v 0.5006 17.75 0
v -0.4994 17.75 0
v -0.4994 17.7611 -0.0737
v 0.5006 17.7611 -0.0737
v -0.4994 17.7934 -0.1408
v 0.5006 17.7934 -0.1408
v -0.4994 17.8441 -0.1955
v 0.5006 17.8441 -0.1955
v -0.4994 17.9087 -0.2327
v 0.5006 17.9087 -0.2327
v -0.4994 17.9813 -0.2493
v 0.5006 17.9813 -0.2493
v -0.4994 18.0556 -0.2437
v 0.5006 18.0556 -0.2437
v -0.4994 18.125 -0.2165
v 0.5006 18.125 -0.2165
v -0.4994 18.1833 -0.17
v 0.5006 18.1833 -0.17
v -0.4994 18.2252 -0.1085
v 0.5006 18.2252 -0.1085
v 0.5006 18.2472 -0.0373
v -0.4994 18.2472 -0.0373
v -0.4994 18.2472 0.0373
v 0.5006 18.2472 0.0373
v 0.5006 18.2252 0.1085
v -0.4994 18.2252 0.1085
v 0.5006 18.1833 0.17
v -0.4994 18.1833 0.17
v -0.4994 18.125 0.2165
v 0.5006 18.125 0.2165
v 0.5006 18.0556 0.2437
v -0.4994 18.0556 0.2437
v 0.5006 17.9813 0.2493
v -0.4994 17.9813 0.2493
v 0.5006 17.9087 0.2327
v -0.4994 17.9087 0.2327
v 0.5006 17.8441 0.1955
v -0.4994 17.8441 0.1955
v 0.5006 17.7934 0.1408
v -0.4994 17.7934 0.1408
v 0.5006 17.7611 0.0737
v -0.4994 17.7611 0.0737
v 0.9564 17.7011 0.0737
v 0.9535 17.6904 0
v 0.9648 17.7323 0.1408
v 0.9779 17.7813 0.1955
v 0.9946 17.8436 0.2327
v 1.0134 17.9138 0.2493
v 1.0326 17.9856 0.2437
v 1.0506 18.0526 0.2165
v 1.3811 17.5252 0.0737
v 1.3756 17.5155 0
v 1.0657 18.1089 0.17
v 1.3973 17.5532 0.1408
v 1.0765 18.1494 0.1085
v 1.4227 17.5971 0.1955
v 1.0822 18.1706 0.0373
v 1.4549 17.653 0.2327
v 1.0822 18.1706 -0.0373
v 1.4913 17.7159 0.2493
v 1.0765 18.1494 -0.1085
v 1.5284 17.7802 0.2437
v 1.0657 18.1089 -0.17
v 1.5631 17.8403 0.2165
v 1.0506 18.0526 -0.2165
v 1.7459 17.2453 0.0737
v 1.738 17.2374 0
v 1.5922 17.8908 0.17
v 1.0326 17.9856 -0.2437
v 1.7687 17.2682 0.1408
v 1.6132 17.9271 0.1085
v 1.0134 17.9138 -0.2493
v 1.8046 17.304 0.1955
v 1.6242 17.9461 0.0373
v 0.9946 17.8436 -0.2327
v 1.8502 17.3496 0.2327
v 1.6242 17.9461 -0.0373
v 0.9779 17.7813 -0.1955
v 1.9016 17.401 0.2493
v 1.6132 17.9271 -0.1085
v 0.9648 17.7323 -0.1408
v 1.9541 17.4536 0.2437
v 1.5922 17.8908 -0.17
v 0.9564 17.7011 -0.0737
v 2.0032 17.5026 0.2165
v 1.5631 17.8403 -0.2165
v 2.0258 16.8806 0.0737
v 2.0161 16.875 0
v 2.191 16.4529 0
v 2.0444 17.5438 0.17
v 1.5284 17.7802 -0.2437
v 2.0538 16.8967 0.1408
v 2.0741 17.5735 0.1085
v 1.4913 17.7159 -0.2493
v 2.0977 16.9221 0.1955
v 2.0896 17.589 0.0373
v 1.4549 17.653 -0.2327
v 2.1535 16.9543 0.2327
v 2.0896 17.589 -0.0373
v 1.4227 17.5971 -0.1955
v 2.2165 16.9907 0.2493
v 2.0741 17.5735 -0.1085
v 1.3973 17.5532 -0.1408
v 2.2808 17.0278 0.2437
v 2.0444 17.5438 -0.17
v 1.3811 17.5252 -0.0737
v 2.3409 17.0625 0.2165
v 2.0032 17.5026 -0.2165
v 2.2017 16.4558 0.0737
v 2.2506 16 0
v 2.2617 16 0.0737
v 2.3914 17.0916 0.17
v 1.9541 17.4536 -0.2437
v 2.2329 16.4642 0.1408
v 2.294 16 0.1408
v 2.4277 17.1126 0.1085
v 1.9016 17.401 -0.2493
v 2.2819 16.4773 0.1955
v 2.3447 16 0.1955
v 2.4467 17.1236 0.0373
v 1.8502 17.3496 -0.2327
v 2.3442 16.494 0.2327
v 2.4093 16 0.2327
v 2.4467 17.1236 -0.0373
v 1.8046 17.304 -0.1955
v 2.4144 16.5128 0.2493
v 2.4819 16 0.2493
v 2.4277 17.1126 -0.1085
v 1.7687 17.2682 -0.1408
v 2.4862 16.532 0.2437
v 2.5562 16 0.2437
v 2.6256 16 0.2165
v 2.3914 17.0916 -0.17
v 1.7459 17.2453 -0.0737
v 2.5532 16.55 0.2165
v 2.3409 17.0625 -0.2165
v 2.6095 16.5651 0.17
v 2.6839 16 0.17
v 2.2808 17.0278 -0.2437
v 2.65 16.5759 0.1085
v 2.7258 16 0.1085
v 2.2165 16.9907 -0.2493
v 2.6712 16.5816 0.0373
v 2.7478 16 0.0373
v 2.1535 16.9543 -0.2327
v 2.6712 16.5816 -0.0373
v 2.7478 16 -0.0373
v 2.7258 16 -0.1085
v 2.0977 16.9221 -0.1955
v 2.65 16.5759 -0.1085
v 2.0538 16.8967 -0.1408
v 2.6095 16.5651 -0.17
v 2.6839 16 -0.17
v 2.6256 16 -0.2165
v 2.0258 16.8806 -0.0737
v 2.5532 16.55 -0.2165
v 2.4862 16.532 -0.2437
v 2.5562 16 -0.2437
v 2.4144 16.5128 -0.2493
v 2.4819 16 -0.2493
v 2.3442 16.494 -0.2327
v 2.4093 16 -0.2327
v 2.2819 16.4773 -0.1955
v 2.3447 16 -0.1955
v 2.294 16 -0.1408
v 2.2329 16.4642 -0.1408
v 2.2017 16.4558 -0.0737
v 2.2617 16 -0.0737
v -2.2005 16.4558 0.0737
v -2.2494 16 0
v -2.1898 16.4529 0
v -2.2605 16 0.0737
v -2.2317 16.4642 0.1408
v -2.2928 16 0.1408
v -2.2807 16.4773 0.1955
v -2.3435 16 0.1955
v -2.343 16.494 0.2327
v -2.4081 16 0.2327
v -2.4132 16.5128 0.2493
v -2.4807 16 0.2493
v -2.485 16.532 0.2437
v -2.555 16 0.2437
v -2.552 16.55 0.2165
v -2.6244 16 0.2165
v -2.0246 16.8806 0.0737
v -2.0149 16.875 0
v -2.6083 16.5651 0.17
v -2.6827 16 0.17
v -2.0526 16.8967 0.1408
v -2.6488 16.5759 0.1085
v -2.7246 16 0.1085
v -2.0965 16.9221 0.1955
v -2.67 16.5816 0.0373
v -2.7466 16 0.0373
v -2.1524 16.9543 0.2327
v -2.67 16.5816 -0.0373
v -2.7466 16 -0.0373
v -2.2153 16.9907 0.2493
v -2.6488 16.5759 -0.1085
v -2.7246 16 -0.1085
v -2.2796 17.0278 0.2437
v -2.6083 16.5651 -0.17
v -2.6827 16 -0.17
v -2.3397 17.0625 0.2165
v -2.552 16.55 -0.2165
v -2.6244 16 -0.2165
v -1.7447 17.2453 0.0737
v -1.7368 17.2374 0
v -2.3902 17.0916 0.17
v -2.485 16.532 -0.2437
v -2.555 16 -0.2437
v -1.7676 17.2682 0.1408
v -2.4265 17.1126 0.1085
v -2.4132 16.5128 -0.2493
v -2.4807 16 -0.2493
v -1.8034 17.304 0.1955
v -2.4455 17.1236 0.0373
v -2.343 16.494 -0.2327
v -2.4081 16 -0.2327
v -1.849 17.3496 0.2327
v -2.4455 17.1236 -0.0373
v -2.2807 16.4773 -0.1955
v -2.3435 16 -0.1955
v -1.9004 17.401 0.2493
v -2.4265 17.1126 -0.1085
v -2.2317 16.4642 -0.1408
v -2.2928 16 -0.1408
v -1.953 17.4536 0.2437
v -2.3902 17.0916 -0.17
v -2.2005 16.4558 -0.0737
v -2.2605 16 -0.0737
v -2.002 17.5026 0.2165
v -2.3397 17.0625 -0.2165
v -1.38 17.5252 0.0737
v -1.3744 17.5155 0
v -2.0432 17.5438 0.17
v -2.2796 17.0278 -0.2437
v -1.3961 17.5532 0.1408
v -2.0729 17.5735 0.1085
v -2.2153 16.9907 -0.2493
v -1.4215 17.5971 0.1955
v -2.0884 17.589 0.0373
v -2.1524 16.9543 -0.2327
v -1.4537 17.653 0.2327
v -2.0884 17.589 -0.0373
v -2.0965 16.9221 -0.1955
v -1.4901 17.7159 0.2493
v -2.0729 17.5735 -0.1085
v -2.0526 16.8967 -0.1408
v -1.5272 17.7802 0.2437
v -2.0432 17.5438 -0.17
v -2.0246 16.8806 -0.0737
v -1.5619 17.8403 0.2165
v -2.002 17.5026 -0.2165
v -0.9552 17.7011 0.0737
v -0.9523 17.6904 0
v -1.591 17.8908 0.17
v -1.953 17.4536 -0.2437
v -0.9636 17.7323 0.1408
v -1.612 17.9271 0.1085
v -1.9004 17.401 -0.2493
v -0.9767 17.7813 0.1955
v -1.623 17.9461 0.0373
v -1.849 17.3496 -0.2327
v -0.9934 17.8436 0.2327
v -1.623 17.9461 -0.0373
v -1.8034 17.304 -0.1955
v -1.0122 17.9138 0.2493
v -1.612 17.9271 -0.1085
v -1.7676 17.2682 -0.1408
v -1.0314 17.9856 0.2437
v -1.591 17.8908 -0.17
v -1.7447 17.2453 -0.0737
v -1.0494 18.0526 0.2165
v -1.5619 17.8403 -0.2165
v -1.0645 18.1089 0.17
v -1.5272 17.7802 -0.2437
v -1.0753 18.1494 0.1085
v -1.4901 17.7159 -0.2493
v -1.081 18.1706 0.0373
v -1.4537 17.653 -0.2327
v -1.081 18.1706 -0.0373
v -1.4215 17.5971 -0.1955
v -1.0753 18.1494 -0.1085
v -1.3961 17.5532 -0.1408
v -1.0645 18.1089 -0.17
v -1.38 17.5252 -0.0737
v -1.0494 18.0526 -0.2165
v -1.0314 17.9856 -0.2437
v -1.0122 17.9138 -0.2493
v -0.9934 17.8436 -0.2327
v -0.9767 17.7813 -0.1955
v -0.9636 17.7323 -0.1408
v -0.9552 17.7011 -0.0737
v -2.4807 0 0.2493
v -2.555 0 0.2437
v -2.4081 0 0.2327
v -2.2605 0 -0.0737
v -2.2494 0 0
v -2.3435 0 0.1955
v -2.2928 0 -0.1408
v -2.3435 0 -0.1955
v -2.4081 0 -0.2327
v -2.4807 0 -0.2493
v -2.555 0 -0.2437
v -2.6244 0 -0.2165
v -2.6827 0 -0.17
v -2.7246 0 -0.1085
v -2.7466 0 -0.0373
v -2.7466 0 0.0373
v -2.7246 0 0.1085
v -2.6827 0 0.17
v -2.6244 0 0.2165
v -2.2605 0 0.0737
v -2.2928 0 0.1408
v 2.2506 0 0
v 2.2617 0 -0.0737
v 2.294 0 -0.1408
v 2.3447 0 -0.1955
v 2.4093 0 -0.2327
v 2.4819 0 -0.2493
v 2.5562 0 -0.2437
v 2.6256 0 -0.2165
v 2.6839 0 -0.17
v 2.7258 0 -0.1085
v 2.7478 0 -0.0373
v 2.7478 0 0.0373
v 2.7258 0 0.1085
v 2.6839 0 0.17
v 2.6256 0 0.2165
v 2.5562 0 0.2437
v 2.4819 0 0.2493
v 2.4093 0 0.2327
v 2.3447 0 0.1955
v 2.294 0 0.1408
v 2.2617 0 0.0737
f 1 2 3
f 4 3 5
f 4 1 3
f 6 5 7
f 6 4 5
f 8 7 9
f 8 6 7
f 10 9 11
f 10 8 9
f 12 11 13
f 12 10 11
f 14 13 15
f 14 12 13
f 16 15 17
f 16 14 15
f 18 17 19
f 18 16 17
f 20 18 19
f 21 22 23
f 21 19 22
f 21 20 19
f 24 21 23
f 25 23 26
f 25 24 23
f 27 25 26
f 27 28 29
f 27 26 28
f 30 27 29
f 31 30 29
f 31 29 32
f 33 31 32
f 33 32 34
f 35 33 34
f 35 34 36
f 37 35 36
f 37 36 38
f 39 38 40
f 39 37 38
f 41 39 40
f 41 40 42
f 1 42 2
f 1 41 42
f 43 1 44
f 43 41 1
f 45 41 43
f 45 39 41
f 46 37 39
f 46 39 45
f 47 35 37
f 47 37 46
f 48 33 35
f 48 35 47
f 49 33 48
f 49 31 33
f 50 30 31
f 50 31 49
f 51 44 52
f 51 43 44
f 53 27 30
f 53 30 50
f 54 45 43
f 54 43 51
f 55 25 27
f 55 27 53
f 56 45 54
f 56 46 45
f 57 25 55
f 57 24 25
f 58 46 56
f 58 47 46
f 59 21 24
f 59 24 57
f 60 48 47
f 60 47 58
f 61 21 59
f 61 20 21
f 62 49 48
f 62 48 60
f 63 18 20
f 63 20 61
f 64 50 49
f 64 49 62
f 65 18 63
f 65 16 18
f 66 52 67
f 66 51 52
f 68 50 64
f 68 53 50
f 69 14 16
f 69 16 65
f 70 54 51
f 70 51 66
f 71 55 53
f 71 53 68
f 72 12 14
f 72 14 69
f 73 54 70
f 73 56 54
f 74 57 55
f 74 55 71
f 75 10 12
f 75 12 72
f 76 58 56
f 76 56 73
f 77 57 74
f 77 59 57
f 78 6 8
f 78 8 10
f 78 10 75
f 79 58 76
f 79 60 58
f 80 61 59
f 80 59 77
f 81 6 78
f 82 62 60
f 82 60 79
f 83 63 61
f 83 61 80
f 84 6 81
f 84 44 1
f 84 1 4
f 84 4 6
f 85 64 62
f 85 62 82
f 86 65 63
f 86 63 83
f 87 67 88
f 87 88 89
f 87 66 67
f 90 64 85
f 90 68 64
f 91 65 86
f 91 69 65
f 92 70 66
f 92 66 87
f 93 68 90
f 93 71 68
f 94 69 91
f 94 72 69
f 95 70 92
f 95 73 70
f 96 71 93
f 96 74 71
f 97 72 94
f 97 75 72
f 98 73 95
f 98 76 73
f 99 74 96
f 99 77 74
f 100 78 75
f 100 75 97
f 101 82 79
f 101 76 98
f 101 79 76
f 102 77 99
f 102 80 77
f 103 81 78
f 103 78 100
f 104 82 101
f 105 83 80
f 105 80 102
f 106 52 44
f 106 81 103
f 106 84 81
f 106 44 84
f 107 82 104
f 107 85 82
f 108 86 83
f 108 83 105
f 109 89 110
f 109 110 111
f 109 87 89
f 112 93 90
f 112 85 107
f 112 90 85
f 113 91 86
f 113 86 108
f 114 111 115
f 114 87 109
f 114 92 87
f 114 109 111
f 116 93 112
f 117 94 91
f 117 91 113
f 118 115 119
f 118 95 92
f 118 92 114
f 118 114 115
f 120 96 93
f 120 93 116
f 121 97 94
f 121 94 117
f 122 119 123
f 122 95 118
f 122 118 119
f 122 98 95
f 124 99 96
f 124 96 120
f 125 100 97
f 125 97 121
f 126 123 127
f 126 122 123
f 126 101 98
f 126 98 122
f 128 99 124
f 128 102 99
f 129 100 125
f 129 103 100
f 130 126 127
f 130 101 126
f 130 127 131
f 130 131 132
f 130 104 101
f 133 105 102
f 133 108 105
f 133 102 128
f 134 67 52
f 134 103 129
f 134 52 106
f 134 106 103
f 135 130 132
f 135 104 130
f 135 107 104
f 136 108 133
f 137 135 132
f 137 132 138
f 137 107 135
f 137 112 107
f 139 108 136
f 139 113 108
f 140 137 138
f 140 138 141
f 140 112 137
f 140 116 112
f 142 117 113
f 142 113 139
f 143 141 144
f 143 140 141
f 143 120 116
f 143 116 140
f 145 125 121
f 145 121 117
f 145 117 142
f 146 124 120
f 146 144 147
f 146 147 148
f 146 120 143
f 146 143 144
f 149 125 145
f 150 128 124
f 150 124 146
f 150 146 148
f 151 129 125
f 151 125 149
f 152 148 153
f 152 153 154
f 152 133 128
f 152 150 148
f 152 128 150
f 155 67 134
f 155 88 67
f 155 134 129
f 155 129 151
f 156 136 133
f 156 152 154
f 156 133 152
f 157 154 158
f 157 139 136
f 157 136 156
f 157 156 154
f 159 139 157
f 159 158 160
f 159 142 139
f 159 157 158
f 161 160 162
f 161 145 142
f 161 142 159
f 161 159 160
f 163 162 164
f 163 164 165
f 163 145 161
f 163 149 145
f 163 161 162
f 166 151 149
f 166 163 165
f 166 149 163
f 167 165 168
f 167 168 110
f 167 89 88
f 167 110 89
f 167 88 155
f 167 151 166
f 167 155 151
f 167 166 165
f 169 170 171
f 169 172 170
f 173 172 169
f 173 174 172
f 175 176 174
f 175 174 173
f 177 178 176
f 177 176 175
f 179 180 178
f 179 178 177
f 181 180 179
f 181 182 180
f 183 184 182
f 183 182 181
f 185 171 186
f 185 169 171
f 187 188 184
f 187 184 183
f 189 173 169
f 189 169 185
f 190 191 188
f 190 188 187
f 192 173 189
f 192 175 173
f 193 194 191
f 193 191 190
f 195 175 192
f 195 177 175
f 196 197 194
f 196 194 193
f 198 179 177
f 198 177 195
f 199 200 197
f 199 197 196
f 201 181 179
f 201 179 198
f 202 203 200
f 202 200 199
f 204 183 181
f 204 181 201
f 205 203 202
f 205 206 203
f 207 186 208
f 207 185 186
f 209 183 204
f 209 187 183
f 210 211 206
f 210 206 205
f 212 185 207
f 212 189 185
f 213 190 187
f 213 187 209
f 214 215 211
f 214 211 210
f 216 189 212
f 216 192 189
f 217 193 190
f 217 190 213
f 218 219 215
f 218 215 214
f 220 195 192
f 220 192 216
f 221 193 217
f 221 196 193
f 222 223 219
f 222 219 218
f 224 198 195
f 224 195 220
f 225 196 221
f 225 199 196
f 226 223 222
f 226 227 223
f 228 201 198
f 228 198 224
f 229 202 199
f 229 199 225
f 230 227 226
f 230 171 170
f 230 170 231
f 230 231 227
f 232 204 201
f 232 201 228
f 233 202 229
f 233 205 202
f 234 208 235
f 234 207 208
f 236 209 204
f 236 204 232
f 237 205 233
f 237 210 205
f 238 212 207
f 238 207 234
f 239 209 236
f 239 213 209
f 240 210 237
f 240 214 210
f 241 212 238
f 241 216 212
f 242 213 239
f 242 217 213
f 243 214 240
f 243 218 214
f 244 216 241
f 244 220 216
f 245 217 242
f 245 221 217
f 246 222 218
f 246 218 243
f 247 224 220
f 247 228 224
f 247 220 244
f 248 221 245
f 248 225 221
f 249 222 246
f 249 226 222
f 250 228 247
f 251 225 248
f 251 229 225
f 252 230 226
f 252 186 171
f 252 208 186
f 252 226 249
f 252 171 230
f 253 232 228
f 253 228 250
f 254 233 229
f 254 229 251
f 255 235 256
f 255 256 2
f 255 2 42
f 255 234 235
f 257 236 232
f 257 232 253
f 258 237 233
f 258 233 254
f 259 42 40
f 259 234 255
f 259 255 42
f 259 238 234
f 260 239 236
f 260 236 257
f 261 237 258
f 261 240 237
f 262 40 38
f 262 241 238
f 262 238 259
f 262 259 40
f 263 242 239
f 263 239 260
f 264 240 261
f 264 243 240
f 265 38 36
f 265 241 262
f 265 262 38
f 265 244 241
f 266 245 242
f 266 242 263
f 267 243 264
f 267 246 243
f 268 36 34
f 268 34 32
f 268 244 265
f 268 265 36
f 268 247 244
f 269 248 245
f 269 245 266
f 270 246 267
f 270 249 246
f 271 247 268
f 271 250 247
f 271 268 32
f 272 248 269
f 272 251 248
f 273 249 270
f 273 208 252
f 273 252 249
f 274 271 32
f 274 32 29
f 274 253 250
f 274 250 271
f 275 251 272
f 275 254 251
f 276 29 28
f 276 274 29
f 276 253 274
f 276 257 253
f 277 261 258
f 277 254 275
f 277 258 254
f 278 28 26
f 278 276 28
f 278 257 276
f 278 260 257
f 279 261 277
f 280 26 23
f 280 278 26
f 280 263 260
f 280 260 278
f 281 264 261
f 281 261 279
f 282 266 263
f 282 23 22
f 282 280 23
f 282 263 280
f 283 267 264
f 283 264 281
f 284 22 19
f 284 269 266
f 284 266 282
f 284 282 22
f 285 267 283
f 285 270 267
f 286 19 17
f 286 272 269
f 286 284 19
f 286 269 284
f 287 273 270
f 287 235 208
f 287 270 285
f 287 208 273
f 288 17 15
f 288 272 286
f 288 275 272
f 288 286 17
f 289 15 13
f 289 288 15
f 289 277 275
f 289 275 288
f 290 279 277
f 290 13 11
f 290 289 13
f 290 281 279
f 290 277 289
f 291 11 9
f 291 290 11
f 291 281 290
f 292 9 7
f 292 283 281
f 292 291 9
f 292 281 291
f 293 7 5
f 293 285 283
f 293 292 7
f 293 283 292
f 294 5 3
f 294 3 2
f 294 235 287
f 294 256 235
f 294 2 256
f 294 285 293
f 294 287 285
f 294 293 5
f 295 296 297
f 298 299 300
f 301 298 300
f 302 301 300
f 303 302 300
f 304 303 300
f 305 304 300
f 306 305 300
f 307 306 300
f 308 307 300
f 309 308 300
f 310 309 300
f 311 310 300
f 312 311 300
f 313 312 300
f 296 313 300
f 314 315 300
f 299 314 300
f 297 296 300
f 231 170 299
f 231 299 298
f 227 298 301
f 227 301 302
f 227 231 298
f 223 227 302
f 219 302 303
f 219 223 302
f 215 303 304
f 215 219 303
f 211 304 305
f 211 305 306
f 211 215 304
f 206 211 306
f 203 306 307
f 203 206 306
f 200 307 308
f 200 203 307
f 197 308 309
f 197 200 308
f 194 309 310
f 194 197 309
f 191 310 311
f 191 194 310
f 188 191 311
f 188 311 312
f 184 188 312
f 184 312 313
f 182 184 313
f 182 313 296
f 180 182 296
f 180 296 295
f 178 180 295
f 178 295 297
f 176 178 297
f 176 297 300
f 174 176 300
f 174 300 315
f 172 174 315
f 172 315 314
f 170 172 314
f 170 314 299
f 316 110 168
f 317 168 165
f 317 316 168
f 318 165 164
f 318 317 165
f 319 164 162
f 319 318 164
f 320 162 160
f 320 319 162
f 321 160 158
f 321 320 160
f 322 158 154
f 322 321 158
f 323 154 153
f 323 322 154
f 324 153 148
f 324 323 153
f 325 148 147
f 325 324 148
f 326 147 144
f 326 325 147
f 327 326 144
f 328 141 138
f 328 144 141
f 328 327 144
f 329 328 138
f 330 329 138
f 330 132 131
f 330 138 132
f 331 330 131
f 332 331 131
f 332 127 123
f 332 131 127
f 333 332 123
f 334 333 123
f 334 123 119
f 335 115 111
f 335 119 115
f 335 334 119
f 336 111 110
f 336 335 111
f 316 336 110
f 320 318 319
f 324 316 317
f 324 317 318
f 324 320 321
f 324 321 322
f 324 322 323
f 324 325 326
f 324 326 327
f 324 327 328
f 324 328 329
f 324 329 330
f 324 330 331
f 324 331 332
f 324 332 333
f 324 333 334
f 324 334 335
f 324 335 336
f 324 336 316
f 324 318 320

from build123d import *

# Parameters (mm, degrees)
SKETCH1_R = 0.25


with BuildPart() as part:
    # Sweep1: sweep along a path in Sketch2
    with BuildLine(Plane.XY) as sweep1_path:
        Line((-2.499404207, 0), (-2.499404207, 16))
        ThreePointArc((-2.499404207, 16), (-1.913617769, 17.414213562), (-0.499404207, 18))
        Line((-0.499404207, 18), (0.500595793, 18))
        ThreePointArc((0.500595793, 18), (1.914809356, 17.414213562), (2.500595793, 16))
        Line((2.500595793, 16), (2.500595793, 0))
    # Sketch1 → Sweep1 (sweep)
    with BuildSketch(Plane(origin=(0, 0, 0), x_dir=(1, 0, 0), z_dir=(0, 1, 0))):
        with Locations((-2.499404207, 0)):
            Circle(SKETCH1_R)
    sweep(path=sweep1_path.line)


solid = part.part
